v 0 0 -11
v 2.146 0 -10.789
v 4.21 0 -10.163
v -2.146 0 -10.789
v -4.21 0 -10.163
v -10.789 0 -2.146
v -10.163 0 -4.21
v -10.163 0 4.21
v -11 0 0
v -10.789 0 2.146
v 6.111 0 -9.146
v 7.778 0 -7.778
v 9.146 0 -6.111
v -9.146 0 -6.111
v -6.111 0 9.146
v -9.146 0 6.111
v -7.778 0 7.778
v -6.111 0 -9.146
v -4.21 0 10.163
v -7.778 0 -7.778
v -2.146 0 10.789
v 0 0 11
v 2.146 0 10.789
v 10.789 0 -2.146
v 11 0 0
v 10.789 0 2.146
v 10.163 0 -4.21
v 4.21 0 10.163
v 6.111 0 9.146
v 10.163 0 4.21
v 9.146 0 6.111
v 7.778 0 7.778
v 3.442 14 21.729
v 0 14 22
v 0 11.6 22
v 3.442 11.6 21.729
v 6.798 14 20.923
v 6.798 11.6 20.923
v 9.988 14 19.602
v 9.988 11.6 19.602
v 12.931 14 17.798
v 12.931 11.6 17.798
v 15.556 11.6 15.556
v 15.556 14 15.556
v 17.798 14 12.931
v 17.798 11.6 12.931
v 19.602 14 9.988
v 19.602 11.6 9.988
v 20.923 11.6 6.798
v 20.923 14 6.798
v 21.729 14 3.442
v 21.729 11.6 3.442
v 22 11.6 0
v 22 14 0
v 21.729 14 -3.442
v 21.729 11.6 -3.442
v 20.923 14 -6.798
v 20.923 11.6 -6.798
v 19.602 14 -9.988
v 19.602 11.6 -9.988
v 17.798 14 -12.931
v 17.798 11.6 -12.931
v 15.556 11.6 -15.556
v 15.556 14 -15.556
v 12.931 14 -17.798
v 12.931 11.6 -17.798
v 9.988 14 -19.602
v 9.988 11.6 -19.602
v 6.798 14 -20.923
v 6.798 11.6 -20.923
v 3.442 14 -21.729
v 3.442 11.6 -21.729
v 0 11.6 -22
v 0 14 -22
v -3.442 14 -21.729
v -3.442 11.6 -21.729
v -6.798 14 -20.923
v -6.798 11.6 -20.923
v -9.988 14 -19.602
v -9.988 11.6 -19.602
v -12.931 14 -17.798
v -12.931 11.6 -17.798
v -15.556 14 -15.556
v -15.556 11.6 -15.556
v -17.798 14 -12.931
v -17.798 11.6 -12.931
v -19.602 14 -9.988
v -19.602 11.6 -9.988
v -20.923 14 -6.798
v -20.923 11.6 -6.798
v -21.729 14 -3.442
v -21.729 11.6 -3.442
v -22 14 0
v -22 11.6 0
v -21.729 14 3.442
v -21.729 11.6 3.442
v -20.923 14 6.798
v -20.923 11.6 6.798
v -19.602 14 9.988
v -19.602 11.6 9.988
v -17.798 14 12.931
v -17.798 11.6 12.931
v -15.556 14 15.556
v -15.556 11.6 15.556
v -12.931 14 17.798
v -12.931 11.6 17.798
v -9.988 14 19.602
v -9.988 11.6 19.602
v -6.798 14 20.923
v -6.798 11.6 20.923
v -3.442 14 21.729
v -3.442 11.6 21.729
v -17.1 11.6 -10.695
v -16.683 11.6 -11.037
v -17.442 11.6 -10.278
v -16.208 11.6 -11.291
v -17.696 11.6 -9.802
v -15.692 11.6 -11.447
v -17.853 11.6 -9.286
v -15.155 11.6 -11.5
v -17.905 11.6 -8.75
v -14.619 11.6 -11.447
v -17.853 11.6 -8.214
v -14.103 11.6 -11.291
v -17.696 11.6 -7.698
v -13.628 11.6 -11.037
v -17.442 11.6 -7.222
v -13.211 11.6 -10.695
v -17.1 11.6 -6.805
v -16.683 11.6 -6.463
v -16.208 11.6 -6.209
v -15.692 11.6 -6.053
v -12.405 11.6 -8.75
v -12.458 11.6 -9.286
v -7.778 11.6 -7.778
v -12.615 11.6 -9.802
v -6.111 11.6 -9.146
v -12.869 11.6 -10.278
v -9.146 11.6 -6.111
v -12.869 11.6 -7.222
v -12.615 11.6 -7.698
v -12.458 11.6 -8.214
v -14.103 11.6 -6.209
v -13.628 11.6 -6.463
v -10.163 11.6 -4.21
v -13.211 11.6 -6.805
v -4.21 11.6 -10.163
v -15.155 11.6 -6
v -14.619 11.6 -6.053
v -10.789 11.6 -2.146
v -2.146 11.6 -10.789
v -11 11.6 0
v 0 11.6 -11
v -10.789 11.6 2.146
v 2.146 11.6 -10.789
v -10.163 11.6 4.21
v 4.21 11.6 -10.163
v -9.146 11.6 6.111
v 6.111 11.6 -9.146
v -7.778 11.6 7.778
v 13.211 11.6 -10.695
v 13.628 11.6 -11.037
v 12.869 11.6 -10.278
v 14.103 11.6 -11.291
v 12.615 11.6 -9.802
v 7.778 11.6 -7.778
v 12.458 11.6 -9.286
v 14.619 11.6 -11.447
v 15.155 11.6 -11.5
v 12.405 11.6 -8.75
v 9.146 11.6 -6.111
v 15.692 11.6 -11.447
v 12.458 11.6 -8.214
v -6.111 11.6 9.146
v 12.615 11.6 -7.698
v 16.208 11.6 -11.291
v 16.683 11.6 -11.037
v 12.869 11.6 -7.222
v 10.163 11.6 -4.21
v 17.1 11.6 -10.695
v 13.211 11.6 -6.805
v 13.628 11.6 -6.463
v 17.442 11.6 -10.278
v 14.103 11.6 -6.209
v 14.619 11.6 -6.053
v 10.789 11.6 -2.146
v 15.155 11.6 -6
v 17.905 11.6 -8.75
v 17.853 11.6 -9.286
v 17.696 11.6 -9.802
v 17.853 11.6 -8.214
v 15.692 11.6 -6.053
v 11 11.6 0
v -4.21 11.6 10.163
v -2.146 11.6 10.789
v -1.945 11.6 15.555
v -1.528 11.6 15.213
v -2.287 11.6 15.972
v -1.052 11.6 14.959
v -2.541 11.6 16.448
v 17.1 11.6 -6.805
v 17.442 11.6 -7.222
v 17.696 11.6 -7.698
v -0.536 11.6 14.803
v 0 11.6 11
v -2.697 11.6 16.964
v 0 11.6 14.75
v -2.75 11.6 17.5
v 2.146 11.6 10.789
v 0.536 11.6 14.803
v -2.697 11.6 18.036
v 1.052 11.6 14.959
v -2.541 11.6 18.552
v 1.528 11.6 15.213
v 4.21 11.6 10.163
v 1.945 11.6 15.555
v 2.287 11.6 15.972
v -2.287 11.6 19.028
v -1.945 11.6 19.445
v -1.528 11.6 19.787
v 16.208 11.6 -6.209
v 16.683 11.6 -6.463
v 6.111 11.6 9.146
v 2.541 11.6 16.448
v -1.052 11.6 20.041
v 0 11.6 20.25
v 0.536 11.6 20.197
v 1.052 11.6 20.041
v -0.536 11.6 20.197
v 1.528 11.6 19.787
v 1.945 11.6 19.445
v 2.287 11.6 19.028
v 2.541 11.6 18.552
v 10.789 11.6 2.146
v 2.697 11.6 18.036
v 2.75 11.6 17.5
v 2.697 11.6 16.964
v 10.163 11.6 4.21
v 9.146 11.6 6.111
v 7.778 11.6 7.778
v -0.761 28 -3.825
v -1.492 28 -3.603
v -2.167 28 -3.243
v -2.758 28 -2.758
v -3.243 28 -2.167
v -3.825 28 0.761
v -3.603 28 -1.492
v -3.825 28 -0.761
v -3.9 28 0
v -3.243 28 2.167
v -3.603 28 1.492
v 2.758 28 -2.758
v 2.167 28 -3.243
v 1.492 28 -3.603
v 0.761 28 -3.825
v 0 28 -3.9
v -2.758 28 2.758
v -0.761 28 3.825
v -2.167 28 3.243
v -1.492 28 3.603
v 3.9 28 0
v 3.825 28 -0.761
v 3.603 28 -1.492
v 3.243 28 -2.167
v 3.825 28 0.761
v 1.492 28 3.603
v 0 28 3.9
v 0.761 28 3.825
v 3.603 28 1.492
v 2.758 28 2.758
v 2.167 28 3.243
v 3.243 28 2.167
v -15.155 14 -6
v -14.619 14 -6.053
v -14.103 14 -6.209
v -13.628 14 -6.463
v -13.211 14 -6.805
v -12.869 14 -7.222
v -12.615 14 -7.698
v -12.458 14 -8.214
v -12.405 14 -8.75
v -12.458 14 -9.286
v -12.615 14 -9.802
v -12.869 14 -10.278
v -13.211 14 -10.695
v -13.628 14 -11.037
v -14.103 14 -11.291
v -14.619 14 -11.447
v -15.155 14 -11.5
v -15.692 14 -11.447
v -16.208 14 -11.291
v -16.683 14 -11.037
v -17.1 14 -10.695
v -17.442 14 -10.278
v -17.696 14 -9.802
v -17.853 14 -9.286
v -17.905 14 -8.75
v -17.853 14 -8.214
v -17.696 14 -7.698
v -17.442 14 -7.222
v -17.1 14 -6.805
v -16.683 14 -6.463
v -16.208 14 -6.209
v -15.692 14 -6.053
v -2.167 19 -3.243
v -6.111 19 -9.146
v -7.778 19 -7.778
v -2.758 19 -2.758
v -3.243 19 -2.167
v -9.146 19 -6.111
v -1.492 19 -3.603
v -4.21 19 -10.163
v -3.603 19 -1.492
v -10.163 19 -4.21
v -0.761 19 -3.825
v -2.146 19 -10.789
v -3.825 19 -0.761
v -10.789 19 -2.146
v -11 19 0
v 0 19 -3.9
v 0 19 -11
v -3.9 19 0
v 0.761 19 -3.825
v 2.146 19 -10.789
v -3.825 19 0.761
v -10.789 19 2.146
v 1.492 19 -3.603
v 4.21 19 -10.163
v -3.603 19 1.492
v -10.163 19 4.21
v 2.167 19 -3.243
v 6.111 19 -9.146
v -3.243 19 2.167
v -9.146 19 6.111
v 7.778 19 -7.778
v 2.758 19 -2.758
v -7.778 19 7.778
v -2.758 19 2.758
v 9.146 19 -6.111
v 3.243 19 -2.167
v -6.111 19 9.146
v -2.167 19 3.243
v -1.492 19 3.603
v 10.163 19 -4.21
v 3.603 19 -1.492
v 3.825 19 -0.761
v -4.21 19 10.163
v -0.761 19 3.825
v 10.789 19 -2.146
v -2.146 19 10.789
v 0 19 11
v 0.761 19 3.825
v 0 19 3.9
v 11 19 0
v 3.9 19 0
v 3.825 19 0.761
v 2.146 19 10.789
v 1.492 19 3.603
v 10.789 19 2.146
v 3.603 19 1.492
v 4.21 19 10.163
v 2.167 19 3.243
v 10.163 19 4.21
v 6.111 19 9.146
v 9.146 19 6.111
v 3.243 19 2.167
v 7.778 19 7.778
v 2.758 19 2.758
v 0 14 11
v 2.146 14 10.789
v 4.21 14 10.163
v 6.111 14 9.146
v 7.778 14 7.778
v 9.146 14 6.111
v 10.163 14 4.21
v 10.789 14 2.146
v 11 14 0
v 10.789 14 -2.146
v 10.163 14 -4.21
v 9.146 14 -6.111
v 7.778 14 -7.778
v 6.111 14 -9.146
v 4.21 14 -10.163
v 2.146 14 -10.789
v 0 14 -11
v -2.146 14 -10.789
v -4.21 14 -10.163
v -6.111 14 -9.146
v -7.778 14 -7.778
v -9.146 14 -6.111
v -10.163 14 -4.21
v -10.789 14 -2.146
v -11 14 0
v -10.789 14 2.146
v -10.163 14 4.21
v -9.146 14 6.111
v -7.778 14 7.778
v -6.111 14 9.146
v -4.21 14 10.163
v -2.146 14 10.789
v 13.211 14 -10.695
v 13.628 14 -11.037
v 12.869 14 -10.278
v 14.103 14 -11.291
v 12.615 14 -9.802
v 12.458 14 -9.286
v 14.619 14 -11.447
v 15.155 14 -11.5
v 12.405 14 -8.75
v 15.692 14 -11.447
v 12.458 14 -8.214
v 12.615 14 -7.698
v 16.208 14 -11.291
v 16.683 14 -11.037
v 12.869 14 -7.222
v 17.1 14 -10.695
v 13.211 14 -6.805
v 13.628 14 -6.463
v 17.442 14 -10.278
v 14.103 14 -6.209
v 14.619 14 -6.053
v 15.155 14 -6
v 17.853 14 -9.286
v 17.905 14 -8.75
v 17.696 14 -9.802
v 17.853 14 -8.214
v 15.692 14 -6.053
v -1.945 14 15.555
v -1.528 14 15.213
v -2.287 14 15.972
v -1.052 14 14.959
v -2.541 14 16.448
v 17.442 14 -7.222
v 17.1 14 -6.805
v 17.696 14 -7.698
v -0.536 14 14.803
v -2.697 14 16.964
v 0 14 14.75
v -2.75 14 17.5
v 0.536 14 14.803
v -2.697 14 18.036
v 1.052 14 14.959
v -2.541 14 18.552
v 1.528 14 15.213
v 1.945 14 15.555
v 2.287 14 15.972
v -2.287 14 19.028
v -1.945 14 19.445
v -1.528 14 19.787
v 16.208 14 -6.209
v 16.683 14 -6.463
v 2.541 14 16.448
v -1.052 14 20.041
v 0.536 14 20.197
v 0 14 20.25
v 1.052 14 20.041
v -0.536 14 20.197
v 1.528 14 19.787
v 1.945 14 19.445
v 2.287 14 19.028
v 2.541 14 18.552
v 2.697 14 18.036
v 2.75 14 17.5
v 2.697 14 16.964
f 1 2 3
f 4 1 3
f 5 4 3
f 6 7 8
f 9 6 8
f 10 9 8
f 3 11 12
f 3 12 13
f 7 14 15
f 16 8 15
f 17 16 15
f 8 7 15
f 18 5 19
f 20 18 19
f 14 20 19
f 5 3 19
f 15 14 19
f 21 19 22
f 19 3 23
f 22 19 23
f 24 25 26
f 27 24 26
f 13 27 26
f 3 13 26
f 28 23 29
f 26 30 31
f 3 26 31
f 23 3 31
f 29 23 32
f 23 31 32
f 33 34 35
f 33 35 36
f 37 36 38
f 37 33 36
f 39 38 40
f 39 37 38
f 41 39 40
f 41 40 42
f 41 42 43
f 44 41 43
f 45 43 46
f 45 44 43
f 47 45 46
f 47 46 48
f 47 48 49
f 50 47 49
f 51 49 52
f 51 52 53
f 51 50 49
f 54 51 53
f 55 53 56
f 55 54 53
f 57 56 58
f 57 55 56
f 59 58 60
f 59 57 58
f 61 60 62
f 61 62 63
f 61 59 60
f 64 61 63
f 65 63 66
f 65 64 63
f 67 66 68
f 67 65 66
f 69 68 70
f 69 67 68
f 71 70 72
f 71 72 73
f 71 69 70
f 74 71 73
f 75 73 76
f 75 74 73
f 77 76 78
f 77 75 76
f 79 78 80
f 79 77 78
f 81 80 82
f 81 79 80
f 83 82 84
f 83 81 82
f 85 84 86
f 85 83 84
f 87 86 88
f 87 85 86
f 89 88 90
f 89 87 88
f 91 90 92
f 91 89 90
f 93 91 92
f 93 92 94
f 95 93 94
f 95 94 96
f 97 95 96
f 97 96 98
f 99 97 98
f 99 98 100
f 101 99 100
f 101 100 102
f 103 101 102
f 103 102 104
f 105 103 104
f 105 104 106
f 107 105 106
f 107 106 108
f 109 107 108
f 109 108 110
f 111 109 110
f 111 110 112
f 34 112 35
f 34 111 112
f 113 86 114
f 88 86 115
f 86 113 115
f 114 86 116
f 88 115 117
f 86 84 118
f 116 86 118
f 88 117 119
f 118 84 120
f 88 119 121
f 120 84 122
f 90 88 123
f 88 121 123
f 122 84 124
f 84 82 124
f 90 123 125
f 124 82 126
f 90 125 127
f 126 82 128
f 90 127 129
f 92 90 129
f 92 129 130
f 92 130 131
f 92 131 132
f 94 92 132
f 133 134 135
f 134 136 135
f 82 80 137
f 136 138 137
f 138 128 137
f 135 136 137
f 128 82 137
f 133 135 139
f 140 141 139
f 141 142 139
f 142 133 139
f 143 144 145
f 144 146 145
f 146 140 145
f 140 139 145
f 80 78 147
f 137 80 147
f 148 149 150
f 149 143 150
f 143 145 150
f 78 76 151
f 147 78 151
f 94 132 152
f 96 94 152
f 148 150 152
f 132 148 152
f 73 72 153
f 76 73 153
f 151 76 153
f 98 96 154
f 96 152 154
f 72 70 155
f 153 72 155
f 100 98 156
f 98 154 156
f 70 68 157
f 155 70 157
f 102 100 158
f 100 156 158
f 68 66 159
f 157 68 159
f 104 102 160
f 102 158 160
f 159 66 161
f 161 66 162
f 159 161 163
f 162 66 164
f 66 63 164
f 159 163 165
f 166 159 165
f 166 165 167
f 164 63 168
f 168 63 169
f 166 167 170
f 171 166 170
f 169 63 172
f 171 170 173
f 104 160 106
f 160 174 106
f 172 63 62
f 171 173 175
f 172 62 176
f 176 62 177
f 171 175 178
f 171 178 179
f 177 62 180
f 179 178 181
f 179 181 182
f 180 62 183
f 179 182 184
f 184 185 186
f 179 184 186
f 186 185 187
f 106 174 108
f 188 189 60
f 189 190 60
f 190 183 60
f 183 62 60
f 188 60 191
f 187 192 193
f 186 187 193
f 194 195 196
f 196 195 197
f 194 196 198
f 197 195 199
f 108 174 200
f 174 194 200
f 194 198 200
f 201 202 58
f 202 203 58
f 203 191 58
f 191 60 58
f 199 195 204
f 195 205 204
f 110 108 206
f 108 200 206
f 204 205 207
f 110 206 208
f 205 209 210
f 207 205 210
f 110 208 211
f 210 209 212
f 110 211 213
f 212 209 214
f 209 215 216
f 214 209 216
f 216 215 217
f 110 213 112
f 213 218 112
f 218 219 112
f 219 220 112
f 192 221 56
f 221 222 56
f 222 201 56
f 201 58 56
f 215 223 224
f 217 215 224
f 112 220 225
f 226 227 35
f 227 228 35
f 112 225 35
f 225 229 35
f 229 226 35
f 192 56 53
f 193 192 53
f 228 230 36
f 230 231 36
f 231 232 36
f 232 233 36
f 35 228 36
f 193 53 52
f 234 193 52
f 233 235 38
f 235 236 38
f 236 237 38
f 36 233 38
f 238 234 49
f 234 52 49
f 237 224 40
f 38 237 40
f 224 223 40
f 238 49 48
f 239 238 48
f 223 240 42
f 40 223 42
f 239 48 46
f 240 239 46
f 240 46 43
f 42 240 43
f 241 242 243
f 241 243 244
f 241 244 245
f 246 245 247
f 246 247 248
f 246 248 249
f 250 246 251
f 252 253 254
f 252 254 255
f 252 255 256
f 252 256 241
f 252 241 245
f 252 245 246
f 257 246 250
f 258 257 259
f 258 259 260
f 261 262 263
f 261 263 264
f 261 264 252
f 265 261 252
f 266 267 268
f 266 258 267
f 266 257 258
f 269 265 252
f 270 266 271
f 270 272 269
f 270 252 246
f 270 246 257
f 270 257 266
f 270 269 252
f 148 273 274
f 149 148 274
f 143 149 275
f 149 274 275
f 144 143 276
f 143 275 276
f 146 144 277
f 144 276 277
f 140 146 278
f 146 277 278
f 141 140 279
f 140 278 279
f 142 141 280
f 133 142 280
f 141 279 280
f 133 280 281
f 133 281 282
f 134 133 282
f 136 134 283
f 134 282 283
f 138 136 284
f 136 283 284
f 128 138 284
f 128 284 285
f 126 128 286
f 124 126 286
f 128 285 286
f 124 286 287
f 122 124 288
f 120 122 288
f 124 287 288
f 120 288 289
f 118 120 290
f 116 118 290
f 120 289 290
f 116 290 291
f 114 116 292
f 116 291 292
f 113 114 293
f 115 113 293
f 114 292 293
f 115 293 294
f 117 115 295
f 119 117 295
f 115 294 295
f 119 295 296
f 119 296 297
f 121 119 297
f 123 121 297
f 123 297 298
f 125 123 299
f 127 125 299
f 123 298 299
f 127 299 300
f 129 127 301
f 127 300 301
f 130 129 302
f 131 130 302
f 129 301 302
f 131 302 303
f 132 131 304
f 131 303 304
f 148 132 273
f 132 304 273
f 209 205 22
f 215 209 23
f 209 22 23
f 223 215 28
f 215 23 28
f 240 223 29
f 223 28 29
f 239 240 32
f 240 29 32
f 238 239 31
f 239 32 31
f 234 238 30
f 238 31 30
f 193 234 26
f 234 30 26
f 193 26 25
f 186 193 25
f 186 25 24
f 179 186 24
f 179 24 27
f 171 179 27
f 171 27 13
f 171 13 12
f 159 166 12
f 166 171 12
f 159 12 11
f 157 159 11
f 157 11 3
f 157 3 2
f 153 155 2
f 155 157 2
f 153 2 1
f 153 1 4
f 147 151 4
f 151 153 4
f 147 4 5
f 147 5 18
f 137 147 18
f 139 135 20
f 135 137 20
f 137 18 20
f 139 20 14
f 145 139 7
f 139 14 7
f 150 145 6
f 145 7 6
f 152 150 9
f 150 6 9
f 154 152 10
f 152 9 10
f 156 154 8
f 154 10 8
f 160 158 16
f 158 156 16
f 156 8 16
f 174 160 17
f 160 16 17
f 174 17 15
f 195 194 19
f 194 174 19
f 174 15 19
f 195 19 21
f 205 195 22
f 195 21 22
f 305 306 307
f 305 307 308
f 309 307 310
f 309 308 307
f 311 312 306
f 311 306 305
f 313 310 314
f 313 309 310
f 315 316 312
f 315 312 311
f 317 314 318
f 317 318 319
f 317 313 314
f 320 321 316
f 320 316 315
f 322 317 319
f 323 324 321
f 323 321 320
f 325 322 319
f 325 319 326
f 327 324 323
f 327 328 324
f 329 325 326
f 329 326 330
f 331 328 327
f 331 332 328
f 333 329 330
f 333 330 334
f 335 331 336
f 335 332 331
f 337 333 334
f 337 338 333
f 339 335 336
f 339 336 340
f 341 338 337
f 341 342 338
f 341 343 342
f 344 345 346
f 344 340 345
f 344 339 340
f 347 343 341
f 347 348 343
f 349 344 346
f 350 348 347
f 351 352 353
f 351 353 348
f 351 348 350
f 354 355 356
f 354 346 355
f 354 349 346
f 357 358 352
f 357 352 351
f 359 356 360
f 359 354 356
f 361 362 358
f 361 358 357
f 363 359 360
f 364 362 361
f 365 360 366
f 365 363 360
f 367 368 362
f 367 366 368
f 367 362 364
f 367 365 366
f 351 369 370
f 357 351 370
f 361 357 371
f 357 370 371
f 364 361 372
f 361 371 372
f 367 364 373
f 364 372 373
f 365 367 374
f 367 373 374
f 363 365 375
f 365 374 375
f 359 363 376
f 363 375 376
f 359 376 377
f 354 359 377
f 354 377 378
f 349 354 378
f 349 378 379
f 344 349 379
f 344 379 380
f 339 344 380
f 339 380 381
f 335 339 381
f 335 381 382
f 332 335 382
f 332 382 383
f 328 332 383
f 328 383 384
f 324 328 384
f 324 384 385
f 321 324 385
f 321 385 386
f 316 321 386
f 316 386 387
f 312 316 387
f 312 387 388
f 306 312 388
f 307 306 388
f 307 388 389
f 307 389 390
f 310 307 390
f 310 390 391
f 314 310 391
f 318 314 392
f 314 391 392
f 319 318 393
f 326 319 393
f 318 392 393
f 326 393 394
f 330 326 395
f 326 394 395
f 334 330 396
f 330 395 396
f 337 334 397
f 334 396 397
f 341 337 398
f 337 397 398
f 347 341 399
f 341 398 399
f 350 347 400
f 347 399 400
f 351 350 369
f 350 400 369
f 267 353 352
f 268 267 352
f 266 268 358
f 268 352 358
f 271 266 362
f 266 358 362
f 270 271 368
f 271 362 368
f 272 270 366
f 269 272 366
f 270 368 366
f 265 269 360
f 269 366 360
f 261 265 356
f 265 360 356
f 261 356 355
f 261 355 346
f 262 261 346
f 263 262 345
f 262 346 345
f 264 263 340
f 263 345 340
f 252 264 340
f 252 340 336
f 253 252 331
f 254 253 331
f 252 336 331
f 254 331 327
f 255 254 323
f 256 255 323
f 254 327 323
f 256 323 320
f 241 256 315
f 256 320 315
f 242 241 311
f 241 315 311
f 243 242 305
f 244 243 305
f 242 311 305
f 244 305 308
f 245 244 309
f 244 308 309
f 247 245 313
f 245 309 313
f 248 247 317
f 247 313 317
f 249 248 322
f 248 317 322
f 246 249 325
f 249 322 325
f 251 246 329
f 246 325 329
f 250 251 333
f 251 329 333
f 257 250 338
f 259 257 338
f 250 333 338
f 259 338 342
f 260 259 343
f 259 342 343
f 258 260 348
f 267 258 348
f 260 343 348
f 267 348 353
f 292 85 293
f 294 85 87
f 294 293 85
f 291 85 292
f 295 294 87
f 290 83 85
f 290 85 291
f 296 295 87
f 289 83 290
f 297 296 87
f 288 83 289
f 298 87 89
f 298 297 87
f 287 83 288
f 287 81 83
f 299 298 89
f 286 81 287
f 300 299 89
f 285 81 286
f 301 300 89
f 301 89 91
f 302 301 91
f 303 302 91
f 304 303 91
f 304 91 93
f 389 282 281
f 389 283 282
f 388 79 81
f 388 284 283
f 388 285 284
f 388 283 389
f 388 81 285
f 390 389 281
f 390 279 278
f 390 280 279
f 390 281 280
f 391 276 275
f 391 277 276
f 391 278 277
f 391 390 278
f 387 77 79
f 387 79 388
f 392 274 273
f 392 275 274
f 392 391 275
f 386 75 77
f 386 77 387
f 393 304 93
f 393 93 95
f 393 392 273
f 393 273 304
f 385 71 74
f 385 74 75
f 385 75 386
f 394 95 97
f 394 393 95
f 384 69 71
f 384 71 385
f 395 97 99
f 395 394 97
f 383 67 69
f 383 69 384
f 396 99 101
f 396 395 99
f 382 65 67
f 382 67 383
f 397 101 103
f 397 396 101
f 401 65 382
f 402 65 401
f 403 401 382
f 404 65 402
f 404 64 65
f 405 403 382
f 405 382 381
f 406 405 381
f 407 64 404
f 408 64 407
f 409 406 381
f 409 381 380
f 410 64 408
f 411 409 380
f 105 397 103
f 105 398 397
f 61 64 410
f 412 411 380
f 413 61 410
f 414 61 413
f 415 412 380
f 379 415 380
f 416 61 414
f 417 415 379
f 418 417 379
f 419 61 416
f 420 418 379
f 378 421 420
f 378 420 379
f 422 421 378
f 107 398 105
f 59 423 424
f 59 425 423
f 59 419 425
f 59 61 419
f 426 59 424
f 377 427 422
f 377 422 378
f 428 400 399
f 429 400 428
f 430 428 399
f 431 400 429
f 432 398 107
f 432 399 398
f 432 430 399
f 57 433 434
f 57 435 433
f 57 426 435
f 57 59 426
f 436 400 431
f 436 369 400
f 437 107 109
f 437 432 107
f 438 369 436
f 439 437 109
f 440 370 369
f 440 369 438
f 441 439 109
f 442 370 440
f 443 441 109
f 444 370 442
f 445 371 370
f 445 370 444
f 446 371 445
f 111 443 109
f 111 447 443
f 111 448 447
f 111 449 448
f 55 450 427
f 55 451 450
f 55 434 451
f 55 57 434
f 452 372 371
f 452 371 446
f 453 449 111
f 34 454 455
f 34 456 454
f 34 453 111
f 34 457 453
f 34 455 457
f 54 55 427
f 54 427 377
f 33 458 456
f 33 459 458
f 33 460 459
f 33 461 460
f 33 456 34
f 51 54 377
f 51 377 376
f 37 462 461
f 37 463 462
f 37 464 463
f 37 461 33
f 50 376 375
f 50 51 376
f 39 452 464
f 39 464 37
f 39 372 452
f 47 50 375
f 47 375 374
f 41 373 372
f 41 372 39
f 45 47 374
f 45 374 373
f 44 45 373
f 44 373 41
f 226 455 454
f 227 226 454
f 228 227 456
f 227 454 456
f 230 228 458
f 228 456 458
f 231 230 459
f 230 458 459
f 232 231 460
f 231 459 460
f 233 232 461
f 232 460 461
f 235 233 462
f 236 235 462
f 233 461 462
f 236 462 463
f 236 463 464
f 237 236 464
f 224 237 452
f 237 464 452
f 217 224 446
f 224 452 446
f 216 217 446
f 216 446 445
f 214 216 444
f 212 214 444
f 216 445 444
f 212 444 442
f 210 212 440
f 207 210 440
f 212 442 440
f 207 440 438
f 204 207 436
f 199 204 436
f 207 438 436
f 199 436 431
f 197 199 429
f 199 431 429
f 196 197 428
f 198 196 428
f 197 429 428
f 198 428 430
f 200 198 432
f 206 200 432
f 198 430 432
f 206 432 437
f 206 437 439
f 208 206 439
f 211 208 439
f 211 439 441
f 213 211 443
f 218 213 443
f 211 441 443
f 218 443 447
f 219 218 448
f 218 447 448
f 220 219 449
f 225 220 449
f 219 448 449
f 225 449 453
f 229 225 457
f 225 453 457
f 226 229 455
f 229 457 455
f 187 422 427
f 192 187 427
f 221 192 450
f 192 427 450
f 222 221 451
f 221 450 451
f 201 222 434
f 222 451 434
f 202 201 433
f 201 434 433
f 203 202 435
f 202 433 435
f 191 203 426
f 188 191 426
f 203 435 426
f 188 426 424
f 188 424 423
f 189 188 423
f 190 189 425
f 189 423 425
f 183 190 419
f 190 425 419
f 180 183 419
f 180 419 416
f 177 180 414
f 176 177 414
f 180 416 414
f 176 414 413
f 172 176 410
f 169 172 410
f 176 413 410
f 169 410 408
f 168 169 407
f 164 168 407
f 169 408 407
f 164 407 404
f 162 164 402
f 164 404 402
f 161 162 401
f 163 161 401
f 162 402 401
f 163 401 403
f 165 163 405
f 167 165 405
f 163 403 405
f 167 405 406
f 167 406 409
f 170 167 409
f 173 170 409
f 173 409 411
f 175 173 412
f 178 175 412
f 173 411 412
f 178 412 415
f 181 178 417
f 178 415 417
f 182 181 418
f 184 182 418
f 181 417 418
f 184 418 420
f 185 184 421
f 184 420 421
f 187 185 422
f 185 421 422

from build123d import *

# Parameters (mm, degrees)
SKETCH1_R           = 11
BOSS_EXTRUDE1_DEPTH = 19
SKETCH2_R           = 3.9
BOSS_EXTRUDE2_DEPTH = 9
SKETCH3_R           = 22
SKETCH3_R_2         = 2.75
BOSS_EXTRUDE3_DEPTH = 2.4


with BuildPart() as part:
    # Sketch1 → Boss-Extrude1 (new body)
    with BuildSketch(Plane(origin=(0, 0, 0), x_dir=(1, 0, 0), z_dir=(0, 1, 0))):
        with Locations(Location((0, 0, 0), (0, 0, 270))):
            Circle(SKETCH1_R)
    extrude(amount=BOSS_EXTRUDE1_DEPTH)

    # Sketch2 → Boss-Extrude2 (add)
    with BuildSketch(Plane(origin=(0, 19, 0), x_dir=(1, 0, 0), z_dir=(0, 1, 0))):
        with Locations(Location((0, 0, 0), (0, 0, 270))):
            Circle(SKETCH2_R)
    extrude(amount=BOSS_EXTRUDE2_DEPTH)

    # Sketch3 → Boss-Extrude3 (add)
    with BuildSketch(Plane(origin=(0, 14, 0), x_dir=(1, 0, 0), z_dir=(0, 1, 0))):
        with Locations(Location((0, 0, 0), (0, 0, 270))):
            Circle(SKETCH3_R)
        with Locations(Location((0, -17.5, 0), (0, 0, 270))):
            Circle(SKETCH3_R_2, mode=Mode.SUBTRACT)
        with Locations(Location((-15.155444566, 8.75, 0), (0, 0, 270))):
            Circle(SKETCH3_R_2, mode=Mode.SUBTRACT)
        with Locations(Location((15.155444566, 8.75, 0), (0, 0, 270))):
            Circle(SKETCH3_R_2, mode=Mode.SUBTRACT)
    extrude(amount=-BOSS_EXTRUDE3_DEPTH)


solid = part.part
